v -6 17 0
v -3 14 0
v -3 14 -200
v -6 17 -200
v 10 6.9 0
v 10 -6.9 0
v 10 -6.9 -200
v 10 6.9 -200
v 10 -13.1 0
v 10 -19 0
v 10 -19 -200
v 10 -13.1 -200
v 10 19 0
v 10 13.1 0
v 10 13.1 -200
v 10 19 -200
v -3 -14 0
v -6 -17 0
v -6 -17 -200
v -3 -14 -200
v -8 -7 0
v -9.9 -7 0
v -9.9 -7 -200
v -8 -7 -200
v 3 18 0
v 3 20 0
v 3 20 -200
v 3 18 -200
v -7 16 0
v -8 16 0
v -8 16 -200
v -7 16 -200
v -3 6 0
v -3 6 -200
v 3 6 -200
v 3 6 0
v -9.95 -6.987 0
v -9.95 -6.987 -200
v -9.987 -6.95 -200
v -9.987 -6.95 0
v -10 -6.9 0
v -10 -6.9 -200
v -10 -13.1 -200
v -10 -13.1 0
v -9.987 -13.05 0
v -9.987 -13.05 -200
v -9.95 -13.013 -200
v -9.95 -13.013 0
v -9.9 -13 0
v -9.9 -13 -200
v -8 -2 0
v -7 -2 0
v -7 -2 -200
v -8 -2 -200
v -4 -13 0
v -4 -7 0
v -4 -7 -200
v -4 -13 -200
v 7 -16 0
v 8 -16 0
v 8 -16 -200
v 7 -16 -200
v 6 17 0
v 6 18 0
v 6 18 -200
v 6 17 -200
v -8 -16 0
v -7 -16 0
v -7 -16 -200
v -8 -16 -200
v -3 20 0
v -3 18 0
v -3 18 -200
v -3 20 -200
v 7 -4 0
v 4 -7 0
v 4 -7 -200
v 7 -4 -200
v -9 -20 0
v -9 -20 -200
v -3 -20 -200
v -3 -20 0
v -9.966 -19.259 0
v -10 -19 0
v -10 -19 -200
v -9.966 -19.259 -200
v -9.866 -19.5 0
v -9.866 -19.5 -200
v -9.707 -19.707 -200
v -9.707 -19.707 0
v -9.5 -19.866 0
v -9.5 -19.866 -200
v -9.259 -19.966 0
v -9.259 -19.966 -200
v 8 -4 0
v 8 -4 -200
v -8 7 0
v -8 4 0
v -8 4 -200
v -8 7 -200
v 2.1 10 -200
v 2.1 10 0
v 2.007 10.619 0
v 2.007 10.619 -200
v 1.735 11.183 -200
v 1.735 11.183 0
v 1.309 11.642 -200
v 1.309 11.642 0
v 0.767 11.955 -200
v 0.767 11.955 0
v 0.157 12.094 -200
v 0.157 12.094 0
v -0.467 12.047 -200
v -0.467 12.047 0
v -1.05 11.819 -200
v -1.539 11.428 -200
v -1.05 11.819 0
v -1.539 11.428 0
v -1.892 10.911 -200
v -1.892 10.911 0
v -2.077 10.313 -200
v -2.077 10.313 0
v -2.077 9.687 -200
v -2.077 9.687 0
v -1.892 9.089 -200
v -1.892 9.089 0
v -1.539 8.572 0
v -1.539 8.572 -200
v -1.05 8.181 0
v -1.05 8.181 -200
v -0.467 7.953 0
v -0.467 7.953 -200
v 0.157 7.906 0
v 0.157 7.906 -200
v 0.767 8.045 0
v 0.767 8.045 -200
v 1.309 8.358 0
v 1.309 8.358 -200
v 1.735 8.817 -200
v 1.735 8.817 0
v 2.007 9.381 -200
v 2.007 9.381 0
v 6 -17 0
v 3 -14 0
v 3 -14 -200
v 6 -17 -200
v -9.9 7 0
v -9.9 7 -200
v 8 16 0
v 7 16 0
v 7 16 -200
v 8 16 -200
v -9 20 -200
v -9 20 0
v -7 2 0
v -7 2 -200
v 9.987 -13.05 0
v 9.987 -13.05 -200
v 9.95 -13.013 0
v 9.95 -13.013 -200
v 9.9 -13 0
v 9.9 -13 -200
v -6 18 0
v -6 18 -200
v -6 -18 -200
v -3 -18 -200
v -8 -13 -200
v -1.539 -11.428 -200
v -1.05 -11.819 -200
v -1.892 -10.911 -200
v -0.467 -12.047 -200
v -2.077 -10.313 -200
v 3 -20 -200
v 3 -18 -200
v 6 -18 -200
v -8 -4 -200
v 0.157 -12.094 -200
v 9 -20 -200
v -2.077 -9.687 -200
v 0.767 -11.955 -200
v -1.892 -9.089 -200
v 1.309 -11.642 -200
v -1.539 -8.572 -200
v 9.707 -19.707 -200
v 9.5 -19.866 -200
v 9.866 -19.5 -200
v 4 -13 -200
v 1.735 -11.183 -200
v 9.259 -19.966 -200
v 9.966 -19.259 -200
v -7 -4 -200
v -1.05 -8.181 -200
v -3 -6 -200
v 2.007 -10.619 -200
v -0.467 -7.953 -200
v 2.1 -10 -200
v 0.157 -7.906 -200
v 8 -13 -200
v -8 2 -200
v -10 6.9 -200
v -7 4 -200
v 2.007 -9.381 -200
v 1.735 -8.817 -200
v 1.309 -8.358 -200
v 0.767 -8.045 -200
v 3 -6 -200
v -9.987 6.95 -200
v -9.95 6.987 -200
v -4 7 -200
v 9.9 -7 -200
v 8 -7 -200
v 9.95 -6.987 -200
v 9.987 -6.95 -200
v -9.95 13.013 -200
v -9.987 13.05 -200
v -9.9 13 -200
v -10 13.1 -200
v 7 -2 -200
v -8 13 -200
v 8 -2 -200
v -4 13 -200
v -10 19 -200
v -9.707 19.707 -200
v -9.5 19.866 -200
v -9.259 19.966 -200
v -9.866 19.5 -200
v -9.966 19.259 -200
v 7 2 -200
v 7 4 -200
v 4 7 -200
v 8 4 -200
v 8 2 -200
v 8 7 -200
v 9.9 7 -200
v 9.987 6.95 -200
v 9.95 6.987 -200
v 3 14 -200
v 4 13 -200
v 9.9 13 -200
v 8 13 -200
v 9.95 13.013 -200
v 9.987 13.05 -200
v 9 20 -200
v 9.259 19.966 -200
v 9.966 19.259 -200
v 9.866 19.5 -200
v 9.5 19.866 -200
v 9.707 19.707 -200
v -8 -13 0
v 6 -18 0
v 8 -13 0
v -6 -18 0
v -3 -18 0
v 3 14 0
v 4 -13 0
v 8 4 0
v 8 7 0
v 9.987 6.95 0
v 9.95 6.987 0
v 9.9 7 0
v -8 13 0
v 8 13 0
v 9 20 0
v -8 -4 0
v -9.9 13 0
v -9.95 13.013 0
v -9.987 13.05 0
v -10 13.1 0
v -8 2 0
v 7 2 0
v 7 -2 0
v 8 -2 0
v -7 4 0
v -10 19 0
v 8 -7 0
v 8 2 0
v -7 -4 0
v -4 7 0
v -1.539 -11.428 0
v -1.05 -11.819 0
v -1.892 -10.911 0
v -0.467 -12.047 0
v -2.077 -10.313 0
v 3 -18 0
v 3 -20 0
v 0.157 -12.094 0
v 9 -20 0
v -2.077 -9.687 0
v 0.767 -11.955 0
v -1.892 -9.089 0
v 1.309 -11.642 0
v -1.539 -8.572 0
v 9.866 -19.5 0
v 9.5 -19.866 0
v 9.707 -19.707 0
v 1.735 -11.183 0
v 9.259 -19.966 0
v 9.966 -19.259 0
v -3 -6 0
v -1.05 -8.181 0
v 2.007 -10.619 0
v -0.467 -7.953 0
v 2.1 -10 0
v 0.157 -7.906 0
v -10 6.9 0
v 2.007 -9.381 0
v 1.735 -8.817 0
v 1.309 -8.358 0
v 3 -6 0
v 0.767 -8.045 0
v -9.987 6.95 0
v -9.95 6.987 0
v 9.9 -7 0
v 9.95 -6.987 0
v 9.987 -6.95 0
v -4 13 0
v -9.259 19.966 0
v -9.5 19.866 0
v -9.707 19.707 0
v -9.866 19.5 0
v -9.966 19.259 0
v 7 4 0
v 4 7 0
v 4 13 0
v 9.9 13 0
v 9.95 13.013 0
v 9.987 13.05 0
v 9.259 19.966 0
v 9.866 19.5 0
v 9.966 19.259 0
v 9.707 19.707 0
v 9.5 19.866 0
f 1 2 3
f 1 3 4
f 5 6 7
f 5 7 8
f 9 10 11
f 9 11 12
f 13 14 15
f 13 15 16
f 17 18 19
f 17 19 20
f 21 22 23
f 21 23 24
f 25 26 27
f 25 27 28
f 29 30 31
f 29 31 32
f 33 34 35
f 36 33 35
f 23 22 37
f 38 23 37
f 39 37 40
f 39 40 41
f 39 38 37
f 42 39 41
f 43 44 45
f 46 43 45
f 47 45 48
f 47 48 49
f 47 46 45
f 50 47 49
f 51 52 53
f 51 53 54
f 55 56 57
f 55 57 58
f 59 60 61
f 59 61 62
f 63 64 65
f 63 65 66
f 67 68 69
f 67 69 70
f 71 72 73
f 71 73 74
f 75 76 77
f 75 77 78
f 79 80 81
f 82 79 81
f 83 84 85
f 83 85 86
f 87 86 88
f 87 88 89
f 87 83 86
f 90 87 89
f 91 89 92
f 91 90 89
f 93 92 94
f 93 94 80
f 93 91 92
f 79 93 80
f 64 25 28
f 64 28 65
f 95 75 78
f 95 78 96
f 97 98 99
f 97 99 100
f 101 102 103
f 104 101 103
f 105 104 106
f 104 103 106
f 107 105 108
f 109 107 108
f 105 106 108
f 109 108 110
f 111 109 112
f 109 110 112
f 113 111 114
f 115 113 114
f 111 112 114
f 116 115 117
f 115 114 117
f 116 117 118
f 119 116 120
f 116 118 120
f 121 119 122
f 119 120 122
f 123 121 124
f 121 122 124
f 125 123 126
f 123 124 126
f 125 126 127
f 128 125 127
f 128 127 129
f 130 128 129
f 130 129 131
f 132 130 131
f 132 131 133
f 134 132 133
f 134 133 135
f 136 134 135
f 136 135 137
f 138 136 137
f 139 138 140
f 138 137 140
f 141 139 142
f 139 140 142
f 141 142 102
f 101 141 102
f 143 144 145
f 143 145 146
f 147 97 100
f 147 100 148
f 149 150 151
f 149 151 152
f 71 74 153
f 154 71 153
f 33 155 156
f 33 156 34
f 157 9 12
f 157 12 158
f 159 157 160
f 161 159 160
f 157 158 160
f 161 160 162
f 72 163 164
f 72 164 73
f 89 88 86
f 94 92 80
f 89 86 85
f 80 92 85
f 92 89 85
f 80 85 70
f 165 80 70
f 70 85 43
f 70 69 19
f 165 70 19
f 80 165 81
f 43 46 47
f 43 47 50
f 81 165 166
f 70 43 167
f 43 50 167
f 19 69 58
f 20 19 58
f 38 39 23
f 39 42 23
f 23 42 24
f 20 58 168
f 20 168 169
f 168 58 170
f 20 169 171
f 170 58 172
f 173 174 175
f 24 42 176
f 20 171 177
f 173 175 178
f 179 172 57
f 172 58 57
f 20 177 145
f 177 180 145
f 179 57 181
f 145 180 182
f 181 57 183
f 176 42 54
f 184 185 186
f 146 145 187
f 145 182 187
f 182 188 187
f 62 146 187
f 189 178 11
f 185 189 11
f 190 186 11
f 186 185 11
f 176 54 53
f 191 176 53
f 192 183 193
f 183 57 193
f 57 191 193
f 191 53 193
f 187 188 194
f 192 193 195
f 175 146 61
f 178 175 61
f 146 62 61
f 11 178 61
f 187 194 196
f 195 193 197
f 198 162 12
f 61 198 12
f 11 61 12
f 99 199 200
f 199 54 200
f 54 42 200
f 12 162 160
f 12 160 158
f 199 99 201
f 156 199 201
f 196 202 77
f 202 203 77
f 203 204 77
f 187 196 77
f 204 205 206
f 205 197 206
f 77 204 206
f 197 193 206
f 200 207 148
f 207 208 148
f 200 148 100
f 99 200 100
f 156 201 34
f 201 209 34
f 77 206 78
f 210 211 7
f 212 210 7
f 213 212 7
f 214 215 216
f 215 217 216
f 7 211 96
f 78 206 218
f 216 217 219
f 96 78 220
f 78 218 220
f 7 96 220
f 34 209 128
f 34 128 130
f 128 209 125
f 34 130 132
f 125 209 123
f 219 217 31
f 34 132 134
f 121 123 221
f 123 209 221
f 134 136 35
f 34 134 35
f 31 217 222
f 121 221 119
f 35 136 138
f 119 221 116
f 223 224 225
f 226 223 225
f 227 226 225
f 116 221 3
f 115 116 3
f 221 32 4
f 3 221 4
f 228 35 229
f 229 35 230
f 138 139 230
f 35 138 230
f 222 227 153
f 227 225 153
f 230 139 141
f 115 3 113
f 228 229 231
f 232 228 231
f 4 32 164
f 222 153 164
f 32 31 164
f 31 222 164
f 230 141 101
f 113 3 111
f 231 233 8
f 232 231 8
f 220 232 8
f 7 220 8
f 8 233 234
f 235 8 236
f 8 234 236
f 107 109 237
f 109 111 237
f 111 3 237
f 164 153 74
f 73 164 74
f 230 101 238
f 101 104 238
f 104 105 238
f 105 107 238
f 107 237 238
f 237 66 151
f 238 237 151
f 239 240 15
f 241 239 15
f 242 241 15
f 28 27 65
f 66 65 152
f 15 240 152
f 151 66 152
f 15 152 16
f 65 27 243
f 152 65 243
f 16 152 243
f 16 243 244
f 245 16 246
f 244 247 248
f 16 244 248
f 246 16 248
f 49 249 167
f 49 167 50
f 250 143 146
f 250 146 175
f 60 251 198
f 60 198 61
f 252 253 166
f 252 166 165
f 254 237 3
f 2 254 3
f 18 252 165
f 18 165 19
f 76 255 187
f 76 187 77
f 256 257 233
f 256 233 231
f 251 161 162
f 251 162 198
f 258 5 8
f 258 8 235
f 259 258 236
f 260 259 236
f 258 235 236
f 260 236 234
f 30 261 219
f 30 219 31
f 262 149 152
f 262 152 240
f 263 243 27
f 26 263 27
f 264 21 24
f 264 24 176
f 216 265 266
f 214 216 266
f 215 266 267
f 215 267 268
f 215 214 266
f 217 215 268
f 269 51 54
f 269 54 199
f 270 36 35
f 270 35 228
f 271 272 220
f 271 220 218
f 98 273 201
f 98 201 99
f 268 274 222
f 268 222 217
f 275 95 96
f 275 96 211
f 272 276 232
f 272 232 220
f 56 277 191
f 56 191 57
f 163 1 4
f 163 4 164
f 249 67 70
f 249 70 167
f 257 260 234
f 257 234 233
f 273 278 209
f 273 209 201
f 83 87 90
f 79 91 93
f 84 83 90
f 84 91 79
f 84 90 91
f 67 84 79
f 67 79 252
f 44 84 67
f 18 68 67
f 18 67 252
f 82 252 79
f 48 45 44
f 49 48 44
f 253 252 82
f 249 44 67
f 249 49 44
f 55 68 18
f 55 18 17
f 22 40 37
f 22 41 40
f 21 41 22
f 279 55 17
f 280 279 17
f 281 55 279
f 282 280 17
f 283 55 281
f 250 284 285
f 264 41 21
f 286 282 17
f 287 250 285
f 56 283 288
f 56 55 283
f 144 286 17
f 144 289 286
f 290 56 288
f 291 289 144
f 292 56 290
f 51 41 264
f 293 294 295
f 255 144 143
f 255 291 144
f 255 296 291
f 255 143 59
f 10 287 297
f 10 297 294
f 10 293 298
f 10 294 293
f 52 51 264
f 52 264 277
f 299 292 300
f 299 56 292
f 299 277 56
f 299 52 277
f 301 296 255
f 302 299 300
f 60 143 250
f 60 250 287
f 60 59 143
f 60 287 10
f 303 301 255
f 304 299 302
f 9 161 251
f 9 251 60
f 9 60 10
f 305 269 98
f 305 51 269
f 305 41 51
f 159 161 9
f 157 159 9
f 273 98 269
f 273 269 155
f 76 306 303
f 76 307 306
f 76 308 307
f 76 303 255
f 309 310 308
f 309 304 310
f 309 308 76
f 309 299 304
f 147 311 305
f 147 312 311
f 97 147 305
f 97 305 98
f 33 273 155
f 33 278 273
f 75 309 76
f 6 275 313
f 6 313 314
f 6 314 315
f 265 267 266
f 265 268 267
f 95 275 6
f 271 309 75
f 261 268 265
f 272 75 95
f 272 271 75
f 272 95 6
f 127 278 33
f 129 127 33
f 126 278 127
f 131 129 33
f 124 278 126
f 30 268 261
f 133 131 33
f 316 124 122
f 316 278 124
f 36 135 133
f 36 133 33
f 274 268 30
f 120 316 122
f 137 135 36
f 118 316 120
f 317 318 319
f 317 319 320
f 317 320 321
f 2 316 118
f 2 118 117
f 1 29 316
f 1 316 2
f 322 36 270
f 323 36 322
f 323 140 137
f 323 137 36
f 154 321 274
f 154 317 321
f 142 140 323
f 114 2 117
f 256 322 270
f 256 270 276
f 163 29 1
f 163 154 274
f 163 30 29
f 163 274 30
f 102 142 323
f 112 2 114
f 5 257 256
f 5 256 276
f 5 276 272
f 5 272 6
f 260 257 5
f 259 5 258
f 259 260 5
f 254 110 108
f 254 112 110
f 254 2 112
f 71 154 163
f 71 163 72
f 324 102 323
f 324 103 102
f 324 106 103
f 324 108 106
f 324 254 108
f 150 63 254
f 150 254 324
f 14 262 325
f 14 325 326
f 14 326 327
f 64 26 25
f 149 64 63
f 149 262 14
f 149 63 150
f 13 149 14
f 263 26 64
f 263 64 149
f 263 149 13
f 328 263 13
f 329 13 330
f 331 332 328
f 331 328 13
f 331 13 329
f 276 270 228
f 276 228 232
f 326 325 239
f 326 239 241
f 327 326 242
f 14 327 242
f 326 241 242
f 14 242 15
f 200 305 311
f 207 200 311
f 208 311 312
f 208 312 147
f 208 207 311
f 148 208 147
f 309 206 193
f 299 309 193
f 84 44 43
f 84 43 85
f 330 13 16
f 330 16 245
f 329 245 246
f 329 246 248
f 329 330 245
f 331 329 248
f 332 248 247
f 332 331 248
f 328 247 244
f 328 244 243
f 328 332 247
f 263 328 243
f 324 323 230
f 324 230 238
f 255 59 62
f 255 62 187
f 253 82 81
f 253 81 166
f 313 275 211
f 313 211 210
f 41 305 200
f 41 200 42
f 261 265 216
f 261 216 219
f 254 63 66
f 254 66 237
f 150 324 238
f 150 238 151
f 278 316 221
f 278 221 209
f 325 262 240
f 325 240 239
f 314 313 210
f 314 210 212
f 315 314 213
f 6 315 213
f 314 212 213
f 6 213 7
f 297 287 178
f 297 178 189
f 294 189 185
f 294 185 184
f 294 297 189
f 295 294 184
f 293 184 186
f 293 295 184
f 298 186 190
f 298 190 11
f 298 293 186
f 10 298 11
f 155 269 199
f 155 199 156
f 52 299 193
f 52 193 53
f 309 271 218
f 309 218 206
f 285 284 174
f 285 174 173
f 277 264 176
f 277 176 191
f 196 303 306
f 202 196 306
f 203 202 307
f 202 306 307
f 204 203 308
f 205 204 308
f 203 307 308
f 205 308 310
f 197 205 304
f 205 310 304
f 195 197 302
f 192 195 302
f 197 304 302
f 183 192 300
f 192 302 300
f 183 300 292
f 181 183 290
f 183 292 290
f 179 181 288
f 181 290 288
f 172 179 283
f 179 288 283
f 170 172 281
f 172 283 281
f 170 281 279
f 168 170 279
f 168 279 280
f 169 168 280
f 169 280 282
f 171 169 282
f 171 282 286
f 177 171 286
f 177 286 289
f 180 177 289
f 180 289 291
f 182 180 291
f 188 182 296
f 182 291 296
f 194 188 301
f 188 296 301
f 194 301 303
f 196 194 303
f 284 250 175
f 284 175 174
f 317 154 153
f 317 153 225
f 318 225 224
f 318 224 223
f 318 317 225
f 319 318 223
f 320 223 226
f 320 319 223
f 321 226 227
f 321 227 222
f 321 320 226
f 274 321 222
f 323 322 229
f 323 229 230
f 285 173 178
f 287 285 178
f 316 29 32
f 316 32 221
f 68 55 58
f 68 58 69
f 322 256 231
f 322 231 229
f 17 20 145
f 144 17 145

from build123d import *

# Parameters (mm, degrees)
SKETCH1_R           = 2.1
BOSS_EXTRUDE1_DEPTH = 200
FILLET1_R           = 0.1


with BuildPart() as part:
    # Sketch1 → Boss-Extrude1 (new body)
    with BuildSketch(Plane.XY):
        with BuildLine():
            Line((10, -19), (10, -13))
            Line((10, -13), (8, -13))
            Line((8, -13), (8, -16))
            Line((8, -16), (7, -16))
            Line((7, -16), (4, -13))
            Line((4, -13), (4, -7))
            Line((4, -7), (7, -4))
            Line((7, -4), (8, -4))
            Line((8, -4), (8, -7))
            Line((8, -7), (10, -7))
            Line((10, -7), (10, 7))
            Line((10, 7), (8, 7))
            Line((8, 7), (8, 4))
            Line((8, 4), (7, 4))
            Line((7, 4), (4, 7))
            Line((4, 7), (4, 13))
            Line((4, 13), (7, 16))
            Line((7, 16), (8, 16))
            Line((8, 16), (8, 13))
            Line((8, 13), (10, 13))
            Line((10, 13), (10, 19))
            ThreePointArc((10, 19), (9.707106781, 19.707106781), (9, 20))
            Line((9, 20), (3, 20))
            Line((3, 20), (3, 18))
            Line((3, 18), (6, 18))
            Line((6, 18), (6, 17))
            Line((6, 17), (3, 14))
            Line((3, 14), (-3, 14))
            Line((-3, 14), (-6, 17))
            Line((-6, 17), (-6, 18))
            Line((-6, 18), (-3, 18))
            Line((-3, 18), (-3, 20))
            Line((-3, 20), (-9, 20))
            ThreePointArc((-9, 20), (-9.707106781, 19.707106781), (-10, 19))
            Line((-10, 19), (-10, 13))
            Line((-10, 13), (-8, 13))
            Line((-8, 13), (-8, 16))
            Line((-8, 16), (-7, 16))
            Line((-7, 16), (-4, 13))
            Line((-4, 13), (-4, 7))
            Line((-4, 7), (-7, 4))
            Line((-7, 4), (-8, 4))
            Line((-8, 4), (-8, 7))
            Line((-8, 7), (-10, 7))
            Line((-10, 7), (-10, -7))
            Line((-10, -7), (-8, -7))
            Line((-8, -7), (-8, -4))
            Line((-8, -4), (-7, -4))
            Line((-7, -4), (-4, -7))
            Line((-4, -7), (-4, -13))
            Line((-4, -13), (-7, -16))
            Line((-7, -16), (-8, -16))
            Line((-8, -16), (-8, -13))
            Line((-8, -13), (-10, -13))
            Line((-10, -13), (-10, -19))
            ThreePointArc((-10, -19), (-9.707106781, -19.707106781), (-9, -20))
            Line((-9, -20), (-3, -20))
            Line((-3, -20), (-3, -18))
            Line((-3, -18), (-6, -18))
            Line((-6, -18), (-6, -17))
            Line((-6, -17), (-3, -14))
            Line((-3, -14), (3, -14))
            Line((3, -14), (6, -17))
            Line((6, -17), (6, -18))
            Line((6, -18), (3, -18))
            Line((3, -18), (3, -20))
            Line((3, -20), (9, -20))
            ThreePointArc((9, -20), (9.707106781, -19.707106781), (10, -19))
        make_face()
        with Locations((0, -10)):
            Circle(SKETCH1_R, mode=Mode.SUBTRACT)
        with Locations((0, 10)):
            Circle(SKETCH1_R, mode=Mode.SUBTRACT)
        Polygon((-7, -2), (-8, -2), (-8, 2), (-7, 2), (-3, 6), (3, 6), (7, 2), (8, 2), (8, -2), (7, -2), (3, -6), (-3, -6), align=None, mode=Mode.SUBTRACT)
    extrude(amount=-BOSS_EXTRUDE1_DEPTH)

    # Fillet1
    fillet1_edges = [part.edges().sort_by_distance(p)[0] for p in [
        (-10, -13, -100),
        (-10, -7, -100),
        (-10, 7, -100),
        (-10, 13, -100),
        (10, 13, -100),
        (10, 7, -100),
        (10, -7, -100),
        (10, -13, -100),
    ]]
    fillet(fillet1_edges, radius=FILLET1_R)


solid = part.part
